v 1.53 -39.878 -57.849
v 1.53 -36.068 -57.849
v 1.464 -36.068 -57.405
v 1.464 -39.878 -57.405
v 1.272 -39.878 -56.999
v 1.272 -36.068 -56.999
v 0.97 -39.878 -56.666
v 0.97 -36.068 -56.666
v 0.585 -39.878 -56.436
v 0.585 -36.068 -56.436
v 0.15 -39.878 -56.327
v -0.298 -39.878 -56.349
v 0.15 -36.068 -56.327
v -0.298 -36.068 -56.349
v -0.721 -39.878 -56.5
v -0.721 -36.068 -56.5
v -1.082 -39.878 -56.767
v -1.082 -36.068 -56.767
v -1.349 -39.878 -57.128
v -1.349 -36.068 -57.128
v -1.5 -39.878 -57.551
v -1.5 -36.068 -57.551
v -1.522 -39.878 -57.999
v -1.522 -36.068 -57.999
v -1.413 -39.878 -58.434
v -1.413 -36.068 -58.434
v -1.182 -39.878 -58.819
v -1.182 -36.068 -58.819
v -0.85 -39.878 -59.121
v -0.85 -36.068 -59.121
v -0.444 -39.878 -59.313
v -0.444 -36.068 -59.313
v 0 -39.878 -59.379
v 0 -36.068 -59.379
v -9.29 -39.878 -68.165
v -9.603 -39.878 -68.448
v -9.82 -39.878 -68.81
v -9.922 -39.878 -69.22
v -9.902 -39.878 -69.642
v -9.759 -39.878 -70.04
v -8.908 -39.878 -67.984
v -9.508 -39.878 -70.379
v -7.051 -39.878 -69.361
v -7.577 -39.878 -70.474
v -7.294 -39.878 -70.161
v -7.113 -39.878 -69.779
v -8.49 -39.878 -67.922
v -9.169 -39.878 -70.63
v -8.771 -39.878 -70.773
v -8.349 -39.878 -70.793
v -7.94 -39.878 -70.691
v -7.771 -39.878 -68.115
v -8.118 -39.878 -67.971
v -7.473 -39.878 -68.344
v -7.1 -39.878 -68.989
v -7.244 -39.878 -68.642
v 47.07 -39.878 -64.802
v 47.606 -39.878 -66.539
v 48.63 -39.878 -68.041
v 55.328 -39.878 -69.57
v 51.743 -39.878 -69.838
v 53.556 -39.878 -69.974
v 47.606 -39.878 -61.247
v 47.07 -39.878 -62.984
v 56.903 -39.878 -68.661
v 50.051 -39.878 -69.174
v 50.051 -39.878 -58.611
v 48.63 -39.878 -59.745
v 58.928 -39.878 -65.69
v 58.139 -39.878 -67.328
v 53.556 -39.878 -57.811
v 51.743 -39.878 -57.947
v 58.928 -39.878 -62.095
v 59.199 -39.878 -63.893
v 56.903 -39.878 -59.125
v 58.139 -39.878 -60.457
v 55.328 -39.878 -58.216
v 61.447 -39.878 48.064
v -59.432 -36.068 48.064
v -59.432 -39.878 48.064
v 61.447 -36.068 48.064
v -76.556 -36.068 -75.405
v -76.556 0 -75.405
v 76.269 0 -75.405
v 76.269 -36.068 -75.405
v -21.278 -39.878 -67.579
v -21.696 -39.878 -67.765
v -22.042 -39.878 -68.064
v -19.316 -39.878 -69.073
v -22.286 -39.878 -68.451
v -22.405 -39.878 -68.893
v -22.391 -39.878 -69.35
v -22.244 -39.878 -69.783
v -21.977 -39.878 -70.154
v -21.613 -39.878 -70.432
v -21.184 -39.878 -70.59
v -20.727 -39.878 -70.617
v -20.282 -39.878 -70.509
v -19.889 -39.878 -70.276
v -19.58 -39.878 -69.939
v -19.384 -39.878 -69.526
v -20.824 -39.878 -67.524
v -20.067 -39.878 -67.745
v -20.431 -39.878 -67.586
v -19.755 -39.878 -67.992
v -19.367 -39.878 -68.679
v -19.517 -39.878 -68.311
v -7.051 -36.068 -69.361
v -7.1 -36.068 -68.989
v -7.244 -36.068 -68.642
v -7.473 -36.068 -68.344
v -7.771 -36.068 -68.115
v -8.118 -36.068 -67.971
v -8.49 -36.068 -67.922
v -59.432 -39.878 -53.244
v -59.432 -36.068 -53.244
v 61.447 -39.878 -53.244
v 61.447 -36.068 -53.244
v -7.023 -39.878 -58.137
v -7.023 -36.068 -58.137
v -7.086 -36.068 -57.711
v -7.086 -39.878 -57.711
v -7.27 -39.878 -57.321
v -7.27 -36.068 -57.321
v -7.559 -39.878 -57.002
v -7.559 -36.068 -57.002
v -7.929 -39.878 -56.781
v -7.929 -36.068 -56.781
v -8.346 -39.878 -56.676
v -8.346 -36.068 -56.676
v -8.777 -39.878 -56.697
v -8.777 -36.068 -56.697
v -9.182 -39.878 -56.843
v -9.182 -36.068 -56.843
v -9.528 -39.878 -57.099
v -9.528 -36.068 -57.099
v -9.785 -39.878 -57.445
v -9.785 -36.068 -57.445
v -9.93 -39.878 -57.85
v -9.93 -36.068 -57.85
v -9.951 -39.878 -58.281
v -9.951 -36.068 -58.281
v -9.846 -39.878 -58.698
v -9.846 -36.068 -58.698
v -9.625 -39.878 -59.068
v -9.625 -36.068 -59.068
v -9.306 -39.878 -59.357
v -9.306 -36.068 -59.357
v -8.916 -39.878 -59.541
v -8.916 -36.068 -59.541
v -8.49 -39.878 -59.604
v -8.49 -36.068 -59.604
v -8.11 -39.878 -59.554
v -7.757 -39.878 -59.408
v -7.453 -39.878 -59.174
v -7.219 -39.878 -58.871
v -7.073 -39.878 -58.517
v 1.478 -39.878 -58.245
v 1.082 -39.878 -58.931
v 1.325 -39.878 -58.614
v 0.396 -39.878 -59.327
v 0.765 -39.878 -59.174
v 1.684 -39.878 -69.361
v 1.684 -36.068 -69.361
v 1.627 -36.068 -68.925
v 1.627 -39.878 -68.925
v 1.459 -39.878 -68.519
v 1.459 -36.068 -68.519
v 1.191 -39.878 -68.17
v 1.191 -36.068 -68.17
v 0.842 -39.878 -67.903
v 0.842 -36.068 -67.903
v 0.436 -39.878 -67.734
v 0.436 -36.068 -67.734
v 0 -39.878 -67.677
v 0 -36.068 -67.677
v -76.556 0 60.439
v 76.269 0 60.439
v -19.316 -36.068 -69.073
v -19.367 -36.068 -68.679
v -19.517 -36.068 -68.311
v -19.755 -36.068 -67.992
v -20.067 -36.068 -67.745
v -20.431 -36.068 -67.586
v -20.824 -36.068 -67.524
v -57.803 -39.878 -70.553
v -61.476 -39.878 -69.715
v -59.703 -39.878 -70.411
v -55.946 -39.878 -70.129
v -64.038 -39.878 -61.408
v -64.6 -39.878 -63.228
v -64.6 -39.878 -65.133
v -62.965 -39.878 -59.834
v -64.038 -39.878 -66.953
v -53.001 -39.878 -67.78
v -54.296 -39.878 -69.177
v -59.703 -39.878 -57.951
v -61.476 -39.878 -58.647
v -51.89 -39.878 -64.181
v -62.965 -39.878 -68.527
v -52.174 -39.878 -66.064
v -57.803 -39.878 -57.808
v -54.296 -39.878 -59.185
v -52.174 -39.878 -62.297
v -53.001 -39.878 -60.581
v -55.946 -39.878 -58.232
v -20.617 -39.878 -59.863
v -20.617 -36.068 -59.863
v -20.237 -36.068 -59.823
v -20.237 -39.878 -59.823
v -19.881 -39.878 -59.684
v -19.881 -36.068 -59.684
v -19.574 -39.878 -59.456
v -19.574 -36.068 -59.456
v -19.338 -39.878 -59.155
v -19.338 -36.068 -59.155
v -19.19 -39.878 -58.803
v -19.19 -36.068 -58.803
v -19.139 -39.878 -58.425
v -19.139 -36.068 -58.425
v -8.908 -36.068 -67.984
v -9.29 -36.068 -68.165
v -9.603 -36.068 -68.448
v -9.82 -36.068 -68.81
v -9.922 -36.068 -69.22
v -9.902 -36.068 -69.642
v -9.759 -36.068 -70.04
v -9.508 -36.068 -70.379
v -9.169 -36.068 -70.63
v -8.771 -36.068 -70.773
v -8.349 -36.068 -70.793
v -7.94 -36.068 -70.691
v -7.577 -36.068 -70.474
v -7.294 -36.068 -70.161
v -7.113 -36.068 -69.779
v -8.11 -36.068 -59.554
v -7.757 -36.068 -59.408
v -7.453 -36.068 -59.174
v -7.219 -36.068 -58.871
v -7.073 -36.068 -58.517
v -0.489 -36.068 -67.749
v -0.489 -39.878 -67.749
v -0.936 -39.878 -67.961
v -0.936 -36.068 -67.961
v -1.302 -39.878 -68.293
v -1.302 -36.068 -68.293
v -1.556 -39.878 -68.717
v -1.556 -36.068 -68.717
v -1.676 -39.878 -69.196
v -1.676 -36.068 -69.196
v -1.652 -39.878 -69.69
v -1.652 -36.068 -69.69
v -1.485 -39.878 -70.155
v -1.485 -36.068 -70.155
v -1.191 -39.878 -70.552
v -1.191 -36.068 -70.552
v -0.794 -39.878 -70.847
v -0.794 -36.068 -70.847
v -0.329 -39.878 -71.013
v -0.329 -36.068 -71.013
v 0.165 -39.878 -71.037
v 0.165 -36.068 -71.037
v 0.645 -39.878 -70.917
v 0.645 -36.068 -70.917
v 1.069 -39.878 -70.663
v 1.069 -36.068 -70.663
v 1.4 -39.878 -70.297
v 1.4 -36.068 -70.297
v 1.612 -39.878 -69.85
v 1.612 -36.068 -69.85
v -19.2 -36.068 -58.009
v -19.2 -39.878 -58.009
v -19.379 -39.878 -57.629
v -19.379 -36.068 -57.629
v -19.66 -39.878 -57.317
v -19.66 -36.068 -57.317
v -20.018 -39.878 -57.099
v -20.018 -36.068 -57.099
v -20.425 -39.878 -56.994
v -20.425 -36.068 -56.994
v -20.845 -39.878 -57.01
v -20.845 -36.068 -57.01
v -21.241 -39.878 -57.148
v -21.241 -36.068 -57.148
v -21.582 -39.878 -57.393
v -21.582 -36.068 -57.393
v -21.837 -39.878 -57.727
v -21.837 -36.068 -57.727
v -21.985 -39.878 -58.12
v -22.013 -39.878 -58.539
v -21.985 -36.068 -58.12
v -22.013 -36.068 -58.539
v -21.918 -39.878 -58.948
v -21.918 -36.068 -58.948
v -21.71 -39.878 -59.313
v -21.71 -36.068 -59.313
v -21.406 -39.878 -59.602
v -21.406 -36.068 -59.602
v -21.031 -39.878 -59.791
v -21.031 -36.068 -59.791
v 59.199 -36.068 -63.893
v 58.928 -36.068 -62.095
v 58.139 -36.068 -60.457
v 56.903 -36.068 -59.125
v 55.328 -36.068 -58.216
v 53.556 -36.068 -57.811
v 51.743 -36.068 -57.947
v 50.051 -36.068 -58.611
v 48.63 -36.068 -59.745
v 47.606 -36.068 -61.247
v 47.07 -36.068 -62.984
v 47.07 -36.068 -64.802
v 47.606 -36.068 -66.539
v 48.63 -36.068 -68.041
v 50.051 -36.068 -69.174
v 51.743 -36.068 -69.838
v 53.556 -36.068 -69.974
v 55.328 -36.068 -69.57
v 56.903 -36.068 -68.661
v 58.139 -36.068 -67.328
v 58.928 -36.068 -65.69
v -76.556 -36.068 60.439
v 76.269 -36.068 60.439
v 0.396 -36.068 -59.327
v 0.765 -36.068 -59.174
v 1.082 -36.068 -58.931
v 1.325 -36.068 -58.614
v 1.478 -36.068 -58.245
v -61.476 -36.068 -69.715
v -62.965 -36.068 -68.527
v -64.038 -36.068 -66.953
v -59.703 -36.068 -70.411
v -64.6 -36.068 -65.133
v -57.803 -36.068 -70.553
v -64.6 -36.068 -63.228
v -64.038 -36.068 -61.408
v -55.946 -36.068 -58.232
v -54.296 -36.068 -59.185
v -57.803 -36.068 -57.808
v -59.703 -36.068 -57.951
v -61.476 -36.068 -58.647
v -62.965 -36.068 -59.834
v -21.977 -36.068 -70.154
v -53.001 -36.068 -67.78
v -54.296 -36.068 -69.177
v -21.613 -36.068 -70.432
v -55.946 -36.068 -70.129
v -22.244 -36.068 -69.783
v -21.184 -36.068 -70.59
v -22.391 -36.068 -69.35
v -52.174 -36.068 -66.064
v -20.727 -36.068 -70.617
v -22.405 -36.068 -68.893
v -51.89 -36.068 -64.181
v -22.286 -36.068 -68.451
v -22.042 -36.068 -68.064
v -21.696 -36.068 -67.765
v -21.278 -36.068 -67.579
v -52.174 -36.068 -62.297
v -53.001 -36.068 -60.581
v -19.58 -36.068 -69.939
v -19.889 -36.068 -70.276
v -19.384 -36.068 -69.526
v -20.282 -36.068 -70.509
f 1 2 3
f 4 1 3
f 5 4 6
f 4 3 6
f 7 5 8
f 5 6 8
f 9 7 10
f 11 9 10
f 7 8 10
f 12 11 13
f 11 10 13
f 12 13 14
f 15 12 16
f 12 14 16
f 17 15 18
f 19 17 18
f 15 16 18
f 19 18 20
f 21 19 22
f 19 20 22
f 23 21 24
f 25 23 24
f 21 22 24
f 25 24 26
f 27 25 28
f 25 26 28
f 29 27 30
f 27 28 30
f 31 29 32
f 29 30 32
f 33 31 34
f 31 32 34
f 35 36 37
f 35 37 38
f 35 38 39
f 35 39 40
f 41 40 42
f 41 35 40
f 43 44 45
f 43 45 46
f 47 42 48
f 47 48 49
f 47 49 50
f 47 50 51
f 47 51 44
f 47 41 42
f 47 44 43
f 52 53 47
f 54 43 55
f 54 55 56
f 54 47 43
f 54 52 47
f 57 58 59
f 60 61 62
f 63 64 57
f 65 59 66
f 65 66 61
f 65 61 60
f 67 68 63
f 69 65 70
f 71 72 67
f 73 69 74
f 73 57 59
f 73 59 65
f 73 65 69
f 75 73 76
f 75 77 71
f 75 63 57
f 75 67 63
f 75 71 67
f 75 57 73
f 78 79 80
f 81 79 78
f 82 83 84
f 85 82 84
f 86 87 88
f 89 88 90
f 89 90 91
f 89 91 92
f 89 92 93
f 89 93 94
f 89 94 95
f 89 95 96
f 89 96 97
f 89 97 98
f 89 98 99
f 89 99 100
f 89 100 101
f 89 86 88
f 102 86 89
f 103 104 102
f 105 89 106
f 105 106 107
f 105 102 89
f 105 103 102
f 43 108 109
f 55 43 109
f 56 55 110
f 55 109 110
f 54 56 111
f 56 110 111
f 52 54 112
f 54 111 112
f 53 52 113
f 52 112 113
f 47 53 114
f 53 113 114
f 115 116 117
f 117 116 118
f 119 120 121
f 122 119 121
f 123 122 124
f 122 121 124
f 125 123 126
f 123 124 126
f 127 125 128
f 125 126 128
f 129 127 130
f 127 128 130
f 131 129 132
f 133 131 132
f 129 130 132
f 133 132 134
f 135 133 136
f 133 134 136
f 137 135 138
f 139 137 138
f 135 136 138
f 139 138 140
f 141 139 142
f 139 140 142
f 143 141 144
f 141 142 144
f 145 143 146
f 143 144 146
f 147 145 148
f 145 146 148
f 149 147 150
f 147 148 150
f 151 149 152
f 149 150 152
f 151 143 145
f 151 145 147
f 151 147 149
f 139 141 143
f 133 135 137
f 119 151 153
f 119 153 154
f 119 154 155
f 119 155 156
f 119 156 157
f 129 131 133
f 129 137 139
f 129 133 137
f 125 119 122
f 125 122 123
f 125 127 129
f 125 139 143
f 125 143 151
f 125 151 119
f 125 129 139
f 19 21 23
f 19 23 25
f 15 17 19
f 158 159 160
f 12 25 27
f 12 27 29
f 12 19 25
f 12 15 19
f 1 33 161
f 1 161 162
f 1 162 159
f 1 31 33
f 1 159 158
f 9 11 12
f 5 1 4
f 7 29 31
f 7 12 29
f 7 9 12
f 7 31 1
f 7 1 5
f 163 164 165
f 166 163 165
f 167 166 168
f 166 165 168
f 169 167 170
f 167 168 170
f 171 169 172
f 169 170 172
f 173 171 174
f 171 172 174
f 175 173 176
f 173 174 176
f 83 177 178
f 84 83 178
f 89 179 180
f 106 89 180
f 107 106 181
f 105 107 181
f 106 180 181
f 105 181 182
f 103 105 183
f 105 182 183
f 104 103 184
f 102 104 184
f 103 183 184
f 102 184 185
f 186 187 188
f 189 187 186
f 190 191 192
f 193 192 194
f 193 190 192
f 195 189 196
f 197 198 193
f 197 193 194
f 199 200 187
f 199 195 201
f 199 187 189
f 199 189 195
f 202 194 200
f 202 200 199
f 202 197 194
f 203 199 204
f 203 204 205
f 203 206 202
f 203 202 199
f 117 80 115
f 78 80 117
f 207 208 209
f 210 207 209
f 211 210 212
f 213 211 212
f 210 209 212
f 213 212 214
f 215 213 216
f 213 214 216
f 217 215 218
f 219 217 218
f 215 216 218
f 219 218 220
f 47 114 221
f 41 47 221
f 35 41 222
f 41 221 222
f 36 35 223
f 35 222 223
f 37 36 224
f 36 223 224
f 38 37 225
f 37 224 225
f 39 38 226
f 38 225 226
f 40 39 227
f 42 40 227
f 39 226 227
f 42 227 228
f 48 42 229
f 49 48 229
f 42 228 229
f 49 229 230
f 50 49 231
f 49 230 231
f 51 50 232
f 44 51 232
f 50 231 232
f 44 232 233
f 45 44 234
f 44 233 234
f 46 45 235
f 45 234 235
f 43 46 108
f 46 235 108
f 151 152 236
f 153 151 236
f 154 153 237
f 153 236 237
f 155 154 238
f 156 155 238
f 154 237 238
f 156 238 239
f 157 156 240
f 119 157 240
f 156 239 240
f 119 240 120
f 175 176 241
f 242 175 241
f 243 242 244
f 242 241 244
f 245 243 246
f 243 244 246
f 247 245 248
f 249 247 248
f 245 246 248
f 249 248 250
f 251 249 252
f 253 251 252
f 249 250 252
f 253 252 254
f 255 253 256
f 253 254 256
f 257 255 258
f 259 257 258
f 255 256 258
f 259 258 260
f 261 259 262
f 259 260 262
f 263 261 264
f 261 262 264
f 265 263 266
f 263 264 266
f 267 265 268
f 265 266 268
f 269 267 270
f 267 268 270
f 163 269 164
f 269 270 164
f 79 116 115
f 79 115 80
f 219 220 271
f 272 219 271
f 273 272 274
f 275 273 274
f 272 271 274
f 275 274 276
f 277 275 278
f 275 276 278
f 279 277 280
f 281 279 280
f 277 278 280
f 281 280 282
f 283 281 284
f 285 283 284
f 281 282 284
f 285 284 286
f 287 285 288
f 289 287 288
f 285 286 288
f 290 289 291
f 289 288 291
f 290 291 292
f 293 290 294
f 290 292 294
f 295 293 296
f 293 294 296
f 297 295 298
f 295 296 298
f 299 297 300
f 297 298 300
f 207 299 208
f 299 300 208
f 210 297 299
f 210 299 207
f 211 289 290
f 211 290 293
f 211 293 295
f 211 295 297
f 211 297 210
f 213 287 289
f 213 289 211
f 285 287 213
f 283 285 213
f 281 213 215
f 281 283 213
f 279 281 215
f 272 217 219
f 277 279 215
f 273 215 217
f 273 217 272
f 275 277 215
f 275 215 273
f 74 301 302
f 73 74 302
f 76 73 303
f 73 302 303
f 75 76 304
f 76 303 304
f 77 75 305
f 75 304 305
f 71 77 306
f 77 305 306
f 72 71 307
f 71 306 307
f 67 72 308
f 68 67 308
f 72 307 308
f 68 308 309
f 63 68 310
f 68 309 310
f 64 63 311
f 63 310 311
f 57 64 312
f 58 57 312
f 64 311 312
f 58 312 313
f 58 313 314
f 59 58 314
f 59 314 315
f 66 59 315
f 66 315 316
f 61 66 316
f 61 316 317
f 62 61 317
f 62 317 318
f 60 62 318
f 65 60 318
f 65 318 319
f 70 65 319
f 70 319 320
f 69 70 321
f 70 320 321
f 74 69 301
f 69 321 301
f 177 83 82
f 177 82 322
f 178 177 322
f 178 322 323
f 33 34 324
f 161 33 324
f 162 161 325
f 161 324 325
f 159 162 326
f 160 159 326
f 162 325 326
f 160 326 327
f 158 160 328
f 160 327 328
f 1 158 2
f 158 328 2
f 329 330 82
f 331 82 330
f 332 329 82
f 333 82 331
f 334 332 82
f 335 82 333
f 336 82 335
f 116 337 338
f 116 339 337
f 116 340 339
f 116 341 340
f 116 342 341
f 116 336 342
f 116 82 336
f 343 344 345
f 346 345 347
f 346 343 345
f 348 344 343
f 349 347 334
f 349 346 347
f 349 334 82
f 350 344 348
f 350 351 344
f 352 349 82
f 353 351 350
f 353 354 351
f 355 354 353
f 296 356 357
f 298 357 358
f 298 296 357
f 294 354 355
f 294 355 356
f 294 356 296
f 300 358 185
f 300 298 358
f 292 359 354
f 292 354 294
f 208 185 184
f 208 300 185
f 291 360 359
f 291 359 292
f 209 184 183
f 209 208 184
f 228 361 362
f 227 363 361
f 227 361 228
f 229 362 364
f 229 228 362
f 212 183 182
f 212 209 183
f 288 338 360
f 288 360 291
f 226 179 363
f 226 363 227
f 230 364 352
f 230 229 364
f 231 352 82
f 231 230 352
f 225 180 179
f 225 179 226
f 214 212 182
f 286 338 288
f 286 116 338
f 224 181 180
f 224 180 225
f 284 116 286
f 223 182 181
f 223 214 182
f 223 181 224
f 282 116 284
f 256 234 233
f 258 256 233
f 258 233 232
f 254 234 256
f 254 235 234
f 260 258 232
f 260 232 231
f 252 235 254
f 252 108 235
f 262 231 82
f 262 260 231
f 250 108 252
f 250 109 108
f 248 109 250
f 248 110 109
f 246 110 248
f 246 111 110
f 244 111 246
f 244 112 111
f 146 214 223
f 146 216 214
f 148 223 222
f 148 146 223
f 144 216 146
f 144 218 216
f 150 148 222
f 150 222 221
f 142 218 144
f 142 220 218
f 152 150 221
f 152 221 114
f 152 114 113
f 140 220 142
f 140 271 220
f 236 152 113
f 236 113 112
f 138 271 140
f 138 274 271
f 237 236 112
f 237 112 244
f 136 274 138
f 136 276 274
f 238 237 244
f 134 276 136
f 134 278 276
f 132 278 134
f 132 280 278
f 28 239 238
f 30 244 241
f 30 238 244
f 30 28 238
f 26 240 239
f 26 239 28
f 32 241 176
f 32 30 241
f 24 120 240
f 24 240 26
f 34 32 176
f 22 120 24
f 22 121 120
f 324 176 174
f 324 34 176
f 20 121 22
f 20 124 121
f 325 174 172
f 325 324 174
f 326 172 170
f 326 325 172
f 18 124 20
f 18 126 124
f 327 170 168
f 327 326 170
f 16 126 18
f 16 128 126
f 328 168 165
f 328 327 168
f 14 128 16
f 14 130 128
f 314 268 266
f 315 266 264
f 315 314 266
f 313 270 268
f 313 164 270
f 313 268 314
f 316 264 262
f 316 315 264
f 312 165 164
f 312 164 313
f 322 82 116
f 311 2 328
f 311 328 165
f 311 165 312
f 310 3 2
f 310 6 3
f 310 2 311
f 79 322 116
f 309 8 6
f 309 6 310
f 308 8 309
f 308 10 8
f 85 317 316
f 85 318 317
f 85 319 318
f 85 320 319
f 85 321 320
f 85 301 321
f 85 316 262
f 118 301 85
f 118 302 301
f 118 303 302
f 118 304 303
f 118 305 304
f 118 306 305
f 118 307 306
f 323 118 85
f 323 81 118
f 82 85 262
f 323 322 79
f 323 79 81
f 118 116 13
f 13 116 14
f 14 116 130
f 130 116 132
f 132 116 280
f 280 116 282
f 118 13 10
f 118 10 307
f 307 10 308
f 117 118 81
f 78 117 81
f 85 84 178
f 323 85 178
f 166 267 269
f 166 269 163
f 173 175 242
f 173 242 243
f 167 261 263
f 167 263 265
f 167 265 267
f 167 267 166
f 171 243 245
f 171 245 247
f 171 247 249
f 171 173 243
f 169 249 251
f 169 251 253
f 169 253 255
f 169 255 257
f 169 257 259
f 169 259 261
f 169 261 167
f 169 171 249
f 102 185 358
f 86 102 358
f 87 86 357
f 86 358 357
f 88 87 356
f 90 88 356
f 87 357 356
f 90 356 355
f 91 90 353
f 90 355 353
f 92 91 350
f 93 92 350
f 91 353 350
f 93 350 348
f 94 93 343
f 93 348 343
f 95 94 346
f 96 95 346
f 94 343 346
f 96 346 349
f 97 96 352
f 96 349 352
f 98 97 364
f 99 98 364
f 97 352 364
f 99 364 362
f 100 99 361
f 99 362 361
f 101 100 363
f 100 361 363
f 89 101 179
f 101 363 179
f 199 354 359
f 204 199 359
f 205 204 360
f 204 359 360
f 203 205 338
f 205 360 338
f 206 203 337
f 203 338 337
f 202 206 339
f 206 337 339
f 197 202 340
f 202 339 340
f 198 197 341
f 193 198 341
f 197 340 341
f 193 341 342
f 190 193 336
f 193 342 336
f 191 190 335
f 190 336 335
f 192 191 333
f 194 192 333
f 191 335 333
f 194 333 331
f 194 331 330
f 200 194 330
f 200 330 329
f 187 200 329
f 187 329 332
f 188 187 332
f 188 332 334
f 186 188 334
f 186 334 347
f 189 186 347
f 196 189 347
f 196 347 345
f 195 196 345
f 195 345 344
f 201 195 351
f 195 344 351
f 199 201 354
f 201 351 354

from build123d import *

# Parameters (mm, degrees)
F0_W     = 152.824863
F0_H     = 135.844316
F1_DEPTH = 36.068
F2_W     = 120.878413
F2_H     = 101.30763
F2_R     = 6.390326
F2_R_2   = 6.098495
F3_DEPTH = 3.81


with BuildPart() as f1:
    # F0 (on Front) → F1 (new body)
    with BuildSketch(Plane.XZ):
        with Locations((-0.143901, -7.482948)):
            Rectangle(F0_W, F0_H)
    extrude(amount=F1_DEPTH)

    # F2 (on face) → F3 (join)
    with BuildSketch(Plane.XZ.offset(36.068)):
        with Locations((1.007318, -2.59025)):
            Rectangle(F2_W, F2_H)
        with Locations((-58.280665, -64.180687)):
            Circle(F2_R)
        with Locations((53.100161, -63.892879)):
            Circle(F2_R_2)
        with BuildLine():
            ThreePointArc((-20.616989, -59.863074), (-19.574403, -59.455771), (-19.139081, -58.42457))
            ThreePointArc((-19.139081, -58.42457), (-21.581818, -57.393368), (-20.616989, -59.863074))
        make_face()
        with BuildLine():
            ThreePointArc((-19.316033, -69.073379), (-19.755277, -67.992353), (-20.824042, -67.524063))
            ThreePointArc((-20.824042, -67.524063), (-21.976553, -70.154405), (-19.316033, -69.073379))
        make_face()
        with BuildLine():
            ThreePointArc((-8.490268, -67.922159), (-9.507815, -70.378735), (-7.051239, -69.361188))
            ThreePointArc((-7.051239, -69.361188), (-7.472721, -68.34364), (-8.490268, -67.922159))
        make_face()
        with BuildLine():
            ThreePointArc((-7.022742, -58.136765), (-9.527966, -57.099067), (-8.490268, -59.604292))
            ThreePointArc((-8.490268, -59.604292), (-7.45257, -59.174463), (-7.022742, -58.136765))
        make_face()
        with BuildLine():
            ThreePointArc((0, -59.378668), (1.08167, -58.930626), (1.529712, -57.848956))
            ThreePointArc((1.529712, -57.848956), (-1.08167, -56.767287), (0, -59.378668))
        make_face()
        with BuildLine():
            ThreePointArc((1.684347, -69.361188), (1.191013, -68.170175), (0, -67.676841))
            ThreePointArc((0, -67.676841), (-1.191013, -70.552201), (1.684347, -69.361188))
        make_face()
    extrude(amount=F3_DEPTH)


solid = f1.part
